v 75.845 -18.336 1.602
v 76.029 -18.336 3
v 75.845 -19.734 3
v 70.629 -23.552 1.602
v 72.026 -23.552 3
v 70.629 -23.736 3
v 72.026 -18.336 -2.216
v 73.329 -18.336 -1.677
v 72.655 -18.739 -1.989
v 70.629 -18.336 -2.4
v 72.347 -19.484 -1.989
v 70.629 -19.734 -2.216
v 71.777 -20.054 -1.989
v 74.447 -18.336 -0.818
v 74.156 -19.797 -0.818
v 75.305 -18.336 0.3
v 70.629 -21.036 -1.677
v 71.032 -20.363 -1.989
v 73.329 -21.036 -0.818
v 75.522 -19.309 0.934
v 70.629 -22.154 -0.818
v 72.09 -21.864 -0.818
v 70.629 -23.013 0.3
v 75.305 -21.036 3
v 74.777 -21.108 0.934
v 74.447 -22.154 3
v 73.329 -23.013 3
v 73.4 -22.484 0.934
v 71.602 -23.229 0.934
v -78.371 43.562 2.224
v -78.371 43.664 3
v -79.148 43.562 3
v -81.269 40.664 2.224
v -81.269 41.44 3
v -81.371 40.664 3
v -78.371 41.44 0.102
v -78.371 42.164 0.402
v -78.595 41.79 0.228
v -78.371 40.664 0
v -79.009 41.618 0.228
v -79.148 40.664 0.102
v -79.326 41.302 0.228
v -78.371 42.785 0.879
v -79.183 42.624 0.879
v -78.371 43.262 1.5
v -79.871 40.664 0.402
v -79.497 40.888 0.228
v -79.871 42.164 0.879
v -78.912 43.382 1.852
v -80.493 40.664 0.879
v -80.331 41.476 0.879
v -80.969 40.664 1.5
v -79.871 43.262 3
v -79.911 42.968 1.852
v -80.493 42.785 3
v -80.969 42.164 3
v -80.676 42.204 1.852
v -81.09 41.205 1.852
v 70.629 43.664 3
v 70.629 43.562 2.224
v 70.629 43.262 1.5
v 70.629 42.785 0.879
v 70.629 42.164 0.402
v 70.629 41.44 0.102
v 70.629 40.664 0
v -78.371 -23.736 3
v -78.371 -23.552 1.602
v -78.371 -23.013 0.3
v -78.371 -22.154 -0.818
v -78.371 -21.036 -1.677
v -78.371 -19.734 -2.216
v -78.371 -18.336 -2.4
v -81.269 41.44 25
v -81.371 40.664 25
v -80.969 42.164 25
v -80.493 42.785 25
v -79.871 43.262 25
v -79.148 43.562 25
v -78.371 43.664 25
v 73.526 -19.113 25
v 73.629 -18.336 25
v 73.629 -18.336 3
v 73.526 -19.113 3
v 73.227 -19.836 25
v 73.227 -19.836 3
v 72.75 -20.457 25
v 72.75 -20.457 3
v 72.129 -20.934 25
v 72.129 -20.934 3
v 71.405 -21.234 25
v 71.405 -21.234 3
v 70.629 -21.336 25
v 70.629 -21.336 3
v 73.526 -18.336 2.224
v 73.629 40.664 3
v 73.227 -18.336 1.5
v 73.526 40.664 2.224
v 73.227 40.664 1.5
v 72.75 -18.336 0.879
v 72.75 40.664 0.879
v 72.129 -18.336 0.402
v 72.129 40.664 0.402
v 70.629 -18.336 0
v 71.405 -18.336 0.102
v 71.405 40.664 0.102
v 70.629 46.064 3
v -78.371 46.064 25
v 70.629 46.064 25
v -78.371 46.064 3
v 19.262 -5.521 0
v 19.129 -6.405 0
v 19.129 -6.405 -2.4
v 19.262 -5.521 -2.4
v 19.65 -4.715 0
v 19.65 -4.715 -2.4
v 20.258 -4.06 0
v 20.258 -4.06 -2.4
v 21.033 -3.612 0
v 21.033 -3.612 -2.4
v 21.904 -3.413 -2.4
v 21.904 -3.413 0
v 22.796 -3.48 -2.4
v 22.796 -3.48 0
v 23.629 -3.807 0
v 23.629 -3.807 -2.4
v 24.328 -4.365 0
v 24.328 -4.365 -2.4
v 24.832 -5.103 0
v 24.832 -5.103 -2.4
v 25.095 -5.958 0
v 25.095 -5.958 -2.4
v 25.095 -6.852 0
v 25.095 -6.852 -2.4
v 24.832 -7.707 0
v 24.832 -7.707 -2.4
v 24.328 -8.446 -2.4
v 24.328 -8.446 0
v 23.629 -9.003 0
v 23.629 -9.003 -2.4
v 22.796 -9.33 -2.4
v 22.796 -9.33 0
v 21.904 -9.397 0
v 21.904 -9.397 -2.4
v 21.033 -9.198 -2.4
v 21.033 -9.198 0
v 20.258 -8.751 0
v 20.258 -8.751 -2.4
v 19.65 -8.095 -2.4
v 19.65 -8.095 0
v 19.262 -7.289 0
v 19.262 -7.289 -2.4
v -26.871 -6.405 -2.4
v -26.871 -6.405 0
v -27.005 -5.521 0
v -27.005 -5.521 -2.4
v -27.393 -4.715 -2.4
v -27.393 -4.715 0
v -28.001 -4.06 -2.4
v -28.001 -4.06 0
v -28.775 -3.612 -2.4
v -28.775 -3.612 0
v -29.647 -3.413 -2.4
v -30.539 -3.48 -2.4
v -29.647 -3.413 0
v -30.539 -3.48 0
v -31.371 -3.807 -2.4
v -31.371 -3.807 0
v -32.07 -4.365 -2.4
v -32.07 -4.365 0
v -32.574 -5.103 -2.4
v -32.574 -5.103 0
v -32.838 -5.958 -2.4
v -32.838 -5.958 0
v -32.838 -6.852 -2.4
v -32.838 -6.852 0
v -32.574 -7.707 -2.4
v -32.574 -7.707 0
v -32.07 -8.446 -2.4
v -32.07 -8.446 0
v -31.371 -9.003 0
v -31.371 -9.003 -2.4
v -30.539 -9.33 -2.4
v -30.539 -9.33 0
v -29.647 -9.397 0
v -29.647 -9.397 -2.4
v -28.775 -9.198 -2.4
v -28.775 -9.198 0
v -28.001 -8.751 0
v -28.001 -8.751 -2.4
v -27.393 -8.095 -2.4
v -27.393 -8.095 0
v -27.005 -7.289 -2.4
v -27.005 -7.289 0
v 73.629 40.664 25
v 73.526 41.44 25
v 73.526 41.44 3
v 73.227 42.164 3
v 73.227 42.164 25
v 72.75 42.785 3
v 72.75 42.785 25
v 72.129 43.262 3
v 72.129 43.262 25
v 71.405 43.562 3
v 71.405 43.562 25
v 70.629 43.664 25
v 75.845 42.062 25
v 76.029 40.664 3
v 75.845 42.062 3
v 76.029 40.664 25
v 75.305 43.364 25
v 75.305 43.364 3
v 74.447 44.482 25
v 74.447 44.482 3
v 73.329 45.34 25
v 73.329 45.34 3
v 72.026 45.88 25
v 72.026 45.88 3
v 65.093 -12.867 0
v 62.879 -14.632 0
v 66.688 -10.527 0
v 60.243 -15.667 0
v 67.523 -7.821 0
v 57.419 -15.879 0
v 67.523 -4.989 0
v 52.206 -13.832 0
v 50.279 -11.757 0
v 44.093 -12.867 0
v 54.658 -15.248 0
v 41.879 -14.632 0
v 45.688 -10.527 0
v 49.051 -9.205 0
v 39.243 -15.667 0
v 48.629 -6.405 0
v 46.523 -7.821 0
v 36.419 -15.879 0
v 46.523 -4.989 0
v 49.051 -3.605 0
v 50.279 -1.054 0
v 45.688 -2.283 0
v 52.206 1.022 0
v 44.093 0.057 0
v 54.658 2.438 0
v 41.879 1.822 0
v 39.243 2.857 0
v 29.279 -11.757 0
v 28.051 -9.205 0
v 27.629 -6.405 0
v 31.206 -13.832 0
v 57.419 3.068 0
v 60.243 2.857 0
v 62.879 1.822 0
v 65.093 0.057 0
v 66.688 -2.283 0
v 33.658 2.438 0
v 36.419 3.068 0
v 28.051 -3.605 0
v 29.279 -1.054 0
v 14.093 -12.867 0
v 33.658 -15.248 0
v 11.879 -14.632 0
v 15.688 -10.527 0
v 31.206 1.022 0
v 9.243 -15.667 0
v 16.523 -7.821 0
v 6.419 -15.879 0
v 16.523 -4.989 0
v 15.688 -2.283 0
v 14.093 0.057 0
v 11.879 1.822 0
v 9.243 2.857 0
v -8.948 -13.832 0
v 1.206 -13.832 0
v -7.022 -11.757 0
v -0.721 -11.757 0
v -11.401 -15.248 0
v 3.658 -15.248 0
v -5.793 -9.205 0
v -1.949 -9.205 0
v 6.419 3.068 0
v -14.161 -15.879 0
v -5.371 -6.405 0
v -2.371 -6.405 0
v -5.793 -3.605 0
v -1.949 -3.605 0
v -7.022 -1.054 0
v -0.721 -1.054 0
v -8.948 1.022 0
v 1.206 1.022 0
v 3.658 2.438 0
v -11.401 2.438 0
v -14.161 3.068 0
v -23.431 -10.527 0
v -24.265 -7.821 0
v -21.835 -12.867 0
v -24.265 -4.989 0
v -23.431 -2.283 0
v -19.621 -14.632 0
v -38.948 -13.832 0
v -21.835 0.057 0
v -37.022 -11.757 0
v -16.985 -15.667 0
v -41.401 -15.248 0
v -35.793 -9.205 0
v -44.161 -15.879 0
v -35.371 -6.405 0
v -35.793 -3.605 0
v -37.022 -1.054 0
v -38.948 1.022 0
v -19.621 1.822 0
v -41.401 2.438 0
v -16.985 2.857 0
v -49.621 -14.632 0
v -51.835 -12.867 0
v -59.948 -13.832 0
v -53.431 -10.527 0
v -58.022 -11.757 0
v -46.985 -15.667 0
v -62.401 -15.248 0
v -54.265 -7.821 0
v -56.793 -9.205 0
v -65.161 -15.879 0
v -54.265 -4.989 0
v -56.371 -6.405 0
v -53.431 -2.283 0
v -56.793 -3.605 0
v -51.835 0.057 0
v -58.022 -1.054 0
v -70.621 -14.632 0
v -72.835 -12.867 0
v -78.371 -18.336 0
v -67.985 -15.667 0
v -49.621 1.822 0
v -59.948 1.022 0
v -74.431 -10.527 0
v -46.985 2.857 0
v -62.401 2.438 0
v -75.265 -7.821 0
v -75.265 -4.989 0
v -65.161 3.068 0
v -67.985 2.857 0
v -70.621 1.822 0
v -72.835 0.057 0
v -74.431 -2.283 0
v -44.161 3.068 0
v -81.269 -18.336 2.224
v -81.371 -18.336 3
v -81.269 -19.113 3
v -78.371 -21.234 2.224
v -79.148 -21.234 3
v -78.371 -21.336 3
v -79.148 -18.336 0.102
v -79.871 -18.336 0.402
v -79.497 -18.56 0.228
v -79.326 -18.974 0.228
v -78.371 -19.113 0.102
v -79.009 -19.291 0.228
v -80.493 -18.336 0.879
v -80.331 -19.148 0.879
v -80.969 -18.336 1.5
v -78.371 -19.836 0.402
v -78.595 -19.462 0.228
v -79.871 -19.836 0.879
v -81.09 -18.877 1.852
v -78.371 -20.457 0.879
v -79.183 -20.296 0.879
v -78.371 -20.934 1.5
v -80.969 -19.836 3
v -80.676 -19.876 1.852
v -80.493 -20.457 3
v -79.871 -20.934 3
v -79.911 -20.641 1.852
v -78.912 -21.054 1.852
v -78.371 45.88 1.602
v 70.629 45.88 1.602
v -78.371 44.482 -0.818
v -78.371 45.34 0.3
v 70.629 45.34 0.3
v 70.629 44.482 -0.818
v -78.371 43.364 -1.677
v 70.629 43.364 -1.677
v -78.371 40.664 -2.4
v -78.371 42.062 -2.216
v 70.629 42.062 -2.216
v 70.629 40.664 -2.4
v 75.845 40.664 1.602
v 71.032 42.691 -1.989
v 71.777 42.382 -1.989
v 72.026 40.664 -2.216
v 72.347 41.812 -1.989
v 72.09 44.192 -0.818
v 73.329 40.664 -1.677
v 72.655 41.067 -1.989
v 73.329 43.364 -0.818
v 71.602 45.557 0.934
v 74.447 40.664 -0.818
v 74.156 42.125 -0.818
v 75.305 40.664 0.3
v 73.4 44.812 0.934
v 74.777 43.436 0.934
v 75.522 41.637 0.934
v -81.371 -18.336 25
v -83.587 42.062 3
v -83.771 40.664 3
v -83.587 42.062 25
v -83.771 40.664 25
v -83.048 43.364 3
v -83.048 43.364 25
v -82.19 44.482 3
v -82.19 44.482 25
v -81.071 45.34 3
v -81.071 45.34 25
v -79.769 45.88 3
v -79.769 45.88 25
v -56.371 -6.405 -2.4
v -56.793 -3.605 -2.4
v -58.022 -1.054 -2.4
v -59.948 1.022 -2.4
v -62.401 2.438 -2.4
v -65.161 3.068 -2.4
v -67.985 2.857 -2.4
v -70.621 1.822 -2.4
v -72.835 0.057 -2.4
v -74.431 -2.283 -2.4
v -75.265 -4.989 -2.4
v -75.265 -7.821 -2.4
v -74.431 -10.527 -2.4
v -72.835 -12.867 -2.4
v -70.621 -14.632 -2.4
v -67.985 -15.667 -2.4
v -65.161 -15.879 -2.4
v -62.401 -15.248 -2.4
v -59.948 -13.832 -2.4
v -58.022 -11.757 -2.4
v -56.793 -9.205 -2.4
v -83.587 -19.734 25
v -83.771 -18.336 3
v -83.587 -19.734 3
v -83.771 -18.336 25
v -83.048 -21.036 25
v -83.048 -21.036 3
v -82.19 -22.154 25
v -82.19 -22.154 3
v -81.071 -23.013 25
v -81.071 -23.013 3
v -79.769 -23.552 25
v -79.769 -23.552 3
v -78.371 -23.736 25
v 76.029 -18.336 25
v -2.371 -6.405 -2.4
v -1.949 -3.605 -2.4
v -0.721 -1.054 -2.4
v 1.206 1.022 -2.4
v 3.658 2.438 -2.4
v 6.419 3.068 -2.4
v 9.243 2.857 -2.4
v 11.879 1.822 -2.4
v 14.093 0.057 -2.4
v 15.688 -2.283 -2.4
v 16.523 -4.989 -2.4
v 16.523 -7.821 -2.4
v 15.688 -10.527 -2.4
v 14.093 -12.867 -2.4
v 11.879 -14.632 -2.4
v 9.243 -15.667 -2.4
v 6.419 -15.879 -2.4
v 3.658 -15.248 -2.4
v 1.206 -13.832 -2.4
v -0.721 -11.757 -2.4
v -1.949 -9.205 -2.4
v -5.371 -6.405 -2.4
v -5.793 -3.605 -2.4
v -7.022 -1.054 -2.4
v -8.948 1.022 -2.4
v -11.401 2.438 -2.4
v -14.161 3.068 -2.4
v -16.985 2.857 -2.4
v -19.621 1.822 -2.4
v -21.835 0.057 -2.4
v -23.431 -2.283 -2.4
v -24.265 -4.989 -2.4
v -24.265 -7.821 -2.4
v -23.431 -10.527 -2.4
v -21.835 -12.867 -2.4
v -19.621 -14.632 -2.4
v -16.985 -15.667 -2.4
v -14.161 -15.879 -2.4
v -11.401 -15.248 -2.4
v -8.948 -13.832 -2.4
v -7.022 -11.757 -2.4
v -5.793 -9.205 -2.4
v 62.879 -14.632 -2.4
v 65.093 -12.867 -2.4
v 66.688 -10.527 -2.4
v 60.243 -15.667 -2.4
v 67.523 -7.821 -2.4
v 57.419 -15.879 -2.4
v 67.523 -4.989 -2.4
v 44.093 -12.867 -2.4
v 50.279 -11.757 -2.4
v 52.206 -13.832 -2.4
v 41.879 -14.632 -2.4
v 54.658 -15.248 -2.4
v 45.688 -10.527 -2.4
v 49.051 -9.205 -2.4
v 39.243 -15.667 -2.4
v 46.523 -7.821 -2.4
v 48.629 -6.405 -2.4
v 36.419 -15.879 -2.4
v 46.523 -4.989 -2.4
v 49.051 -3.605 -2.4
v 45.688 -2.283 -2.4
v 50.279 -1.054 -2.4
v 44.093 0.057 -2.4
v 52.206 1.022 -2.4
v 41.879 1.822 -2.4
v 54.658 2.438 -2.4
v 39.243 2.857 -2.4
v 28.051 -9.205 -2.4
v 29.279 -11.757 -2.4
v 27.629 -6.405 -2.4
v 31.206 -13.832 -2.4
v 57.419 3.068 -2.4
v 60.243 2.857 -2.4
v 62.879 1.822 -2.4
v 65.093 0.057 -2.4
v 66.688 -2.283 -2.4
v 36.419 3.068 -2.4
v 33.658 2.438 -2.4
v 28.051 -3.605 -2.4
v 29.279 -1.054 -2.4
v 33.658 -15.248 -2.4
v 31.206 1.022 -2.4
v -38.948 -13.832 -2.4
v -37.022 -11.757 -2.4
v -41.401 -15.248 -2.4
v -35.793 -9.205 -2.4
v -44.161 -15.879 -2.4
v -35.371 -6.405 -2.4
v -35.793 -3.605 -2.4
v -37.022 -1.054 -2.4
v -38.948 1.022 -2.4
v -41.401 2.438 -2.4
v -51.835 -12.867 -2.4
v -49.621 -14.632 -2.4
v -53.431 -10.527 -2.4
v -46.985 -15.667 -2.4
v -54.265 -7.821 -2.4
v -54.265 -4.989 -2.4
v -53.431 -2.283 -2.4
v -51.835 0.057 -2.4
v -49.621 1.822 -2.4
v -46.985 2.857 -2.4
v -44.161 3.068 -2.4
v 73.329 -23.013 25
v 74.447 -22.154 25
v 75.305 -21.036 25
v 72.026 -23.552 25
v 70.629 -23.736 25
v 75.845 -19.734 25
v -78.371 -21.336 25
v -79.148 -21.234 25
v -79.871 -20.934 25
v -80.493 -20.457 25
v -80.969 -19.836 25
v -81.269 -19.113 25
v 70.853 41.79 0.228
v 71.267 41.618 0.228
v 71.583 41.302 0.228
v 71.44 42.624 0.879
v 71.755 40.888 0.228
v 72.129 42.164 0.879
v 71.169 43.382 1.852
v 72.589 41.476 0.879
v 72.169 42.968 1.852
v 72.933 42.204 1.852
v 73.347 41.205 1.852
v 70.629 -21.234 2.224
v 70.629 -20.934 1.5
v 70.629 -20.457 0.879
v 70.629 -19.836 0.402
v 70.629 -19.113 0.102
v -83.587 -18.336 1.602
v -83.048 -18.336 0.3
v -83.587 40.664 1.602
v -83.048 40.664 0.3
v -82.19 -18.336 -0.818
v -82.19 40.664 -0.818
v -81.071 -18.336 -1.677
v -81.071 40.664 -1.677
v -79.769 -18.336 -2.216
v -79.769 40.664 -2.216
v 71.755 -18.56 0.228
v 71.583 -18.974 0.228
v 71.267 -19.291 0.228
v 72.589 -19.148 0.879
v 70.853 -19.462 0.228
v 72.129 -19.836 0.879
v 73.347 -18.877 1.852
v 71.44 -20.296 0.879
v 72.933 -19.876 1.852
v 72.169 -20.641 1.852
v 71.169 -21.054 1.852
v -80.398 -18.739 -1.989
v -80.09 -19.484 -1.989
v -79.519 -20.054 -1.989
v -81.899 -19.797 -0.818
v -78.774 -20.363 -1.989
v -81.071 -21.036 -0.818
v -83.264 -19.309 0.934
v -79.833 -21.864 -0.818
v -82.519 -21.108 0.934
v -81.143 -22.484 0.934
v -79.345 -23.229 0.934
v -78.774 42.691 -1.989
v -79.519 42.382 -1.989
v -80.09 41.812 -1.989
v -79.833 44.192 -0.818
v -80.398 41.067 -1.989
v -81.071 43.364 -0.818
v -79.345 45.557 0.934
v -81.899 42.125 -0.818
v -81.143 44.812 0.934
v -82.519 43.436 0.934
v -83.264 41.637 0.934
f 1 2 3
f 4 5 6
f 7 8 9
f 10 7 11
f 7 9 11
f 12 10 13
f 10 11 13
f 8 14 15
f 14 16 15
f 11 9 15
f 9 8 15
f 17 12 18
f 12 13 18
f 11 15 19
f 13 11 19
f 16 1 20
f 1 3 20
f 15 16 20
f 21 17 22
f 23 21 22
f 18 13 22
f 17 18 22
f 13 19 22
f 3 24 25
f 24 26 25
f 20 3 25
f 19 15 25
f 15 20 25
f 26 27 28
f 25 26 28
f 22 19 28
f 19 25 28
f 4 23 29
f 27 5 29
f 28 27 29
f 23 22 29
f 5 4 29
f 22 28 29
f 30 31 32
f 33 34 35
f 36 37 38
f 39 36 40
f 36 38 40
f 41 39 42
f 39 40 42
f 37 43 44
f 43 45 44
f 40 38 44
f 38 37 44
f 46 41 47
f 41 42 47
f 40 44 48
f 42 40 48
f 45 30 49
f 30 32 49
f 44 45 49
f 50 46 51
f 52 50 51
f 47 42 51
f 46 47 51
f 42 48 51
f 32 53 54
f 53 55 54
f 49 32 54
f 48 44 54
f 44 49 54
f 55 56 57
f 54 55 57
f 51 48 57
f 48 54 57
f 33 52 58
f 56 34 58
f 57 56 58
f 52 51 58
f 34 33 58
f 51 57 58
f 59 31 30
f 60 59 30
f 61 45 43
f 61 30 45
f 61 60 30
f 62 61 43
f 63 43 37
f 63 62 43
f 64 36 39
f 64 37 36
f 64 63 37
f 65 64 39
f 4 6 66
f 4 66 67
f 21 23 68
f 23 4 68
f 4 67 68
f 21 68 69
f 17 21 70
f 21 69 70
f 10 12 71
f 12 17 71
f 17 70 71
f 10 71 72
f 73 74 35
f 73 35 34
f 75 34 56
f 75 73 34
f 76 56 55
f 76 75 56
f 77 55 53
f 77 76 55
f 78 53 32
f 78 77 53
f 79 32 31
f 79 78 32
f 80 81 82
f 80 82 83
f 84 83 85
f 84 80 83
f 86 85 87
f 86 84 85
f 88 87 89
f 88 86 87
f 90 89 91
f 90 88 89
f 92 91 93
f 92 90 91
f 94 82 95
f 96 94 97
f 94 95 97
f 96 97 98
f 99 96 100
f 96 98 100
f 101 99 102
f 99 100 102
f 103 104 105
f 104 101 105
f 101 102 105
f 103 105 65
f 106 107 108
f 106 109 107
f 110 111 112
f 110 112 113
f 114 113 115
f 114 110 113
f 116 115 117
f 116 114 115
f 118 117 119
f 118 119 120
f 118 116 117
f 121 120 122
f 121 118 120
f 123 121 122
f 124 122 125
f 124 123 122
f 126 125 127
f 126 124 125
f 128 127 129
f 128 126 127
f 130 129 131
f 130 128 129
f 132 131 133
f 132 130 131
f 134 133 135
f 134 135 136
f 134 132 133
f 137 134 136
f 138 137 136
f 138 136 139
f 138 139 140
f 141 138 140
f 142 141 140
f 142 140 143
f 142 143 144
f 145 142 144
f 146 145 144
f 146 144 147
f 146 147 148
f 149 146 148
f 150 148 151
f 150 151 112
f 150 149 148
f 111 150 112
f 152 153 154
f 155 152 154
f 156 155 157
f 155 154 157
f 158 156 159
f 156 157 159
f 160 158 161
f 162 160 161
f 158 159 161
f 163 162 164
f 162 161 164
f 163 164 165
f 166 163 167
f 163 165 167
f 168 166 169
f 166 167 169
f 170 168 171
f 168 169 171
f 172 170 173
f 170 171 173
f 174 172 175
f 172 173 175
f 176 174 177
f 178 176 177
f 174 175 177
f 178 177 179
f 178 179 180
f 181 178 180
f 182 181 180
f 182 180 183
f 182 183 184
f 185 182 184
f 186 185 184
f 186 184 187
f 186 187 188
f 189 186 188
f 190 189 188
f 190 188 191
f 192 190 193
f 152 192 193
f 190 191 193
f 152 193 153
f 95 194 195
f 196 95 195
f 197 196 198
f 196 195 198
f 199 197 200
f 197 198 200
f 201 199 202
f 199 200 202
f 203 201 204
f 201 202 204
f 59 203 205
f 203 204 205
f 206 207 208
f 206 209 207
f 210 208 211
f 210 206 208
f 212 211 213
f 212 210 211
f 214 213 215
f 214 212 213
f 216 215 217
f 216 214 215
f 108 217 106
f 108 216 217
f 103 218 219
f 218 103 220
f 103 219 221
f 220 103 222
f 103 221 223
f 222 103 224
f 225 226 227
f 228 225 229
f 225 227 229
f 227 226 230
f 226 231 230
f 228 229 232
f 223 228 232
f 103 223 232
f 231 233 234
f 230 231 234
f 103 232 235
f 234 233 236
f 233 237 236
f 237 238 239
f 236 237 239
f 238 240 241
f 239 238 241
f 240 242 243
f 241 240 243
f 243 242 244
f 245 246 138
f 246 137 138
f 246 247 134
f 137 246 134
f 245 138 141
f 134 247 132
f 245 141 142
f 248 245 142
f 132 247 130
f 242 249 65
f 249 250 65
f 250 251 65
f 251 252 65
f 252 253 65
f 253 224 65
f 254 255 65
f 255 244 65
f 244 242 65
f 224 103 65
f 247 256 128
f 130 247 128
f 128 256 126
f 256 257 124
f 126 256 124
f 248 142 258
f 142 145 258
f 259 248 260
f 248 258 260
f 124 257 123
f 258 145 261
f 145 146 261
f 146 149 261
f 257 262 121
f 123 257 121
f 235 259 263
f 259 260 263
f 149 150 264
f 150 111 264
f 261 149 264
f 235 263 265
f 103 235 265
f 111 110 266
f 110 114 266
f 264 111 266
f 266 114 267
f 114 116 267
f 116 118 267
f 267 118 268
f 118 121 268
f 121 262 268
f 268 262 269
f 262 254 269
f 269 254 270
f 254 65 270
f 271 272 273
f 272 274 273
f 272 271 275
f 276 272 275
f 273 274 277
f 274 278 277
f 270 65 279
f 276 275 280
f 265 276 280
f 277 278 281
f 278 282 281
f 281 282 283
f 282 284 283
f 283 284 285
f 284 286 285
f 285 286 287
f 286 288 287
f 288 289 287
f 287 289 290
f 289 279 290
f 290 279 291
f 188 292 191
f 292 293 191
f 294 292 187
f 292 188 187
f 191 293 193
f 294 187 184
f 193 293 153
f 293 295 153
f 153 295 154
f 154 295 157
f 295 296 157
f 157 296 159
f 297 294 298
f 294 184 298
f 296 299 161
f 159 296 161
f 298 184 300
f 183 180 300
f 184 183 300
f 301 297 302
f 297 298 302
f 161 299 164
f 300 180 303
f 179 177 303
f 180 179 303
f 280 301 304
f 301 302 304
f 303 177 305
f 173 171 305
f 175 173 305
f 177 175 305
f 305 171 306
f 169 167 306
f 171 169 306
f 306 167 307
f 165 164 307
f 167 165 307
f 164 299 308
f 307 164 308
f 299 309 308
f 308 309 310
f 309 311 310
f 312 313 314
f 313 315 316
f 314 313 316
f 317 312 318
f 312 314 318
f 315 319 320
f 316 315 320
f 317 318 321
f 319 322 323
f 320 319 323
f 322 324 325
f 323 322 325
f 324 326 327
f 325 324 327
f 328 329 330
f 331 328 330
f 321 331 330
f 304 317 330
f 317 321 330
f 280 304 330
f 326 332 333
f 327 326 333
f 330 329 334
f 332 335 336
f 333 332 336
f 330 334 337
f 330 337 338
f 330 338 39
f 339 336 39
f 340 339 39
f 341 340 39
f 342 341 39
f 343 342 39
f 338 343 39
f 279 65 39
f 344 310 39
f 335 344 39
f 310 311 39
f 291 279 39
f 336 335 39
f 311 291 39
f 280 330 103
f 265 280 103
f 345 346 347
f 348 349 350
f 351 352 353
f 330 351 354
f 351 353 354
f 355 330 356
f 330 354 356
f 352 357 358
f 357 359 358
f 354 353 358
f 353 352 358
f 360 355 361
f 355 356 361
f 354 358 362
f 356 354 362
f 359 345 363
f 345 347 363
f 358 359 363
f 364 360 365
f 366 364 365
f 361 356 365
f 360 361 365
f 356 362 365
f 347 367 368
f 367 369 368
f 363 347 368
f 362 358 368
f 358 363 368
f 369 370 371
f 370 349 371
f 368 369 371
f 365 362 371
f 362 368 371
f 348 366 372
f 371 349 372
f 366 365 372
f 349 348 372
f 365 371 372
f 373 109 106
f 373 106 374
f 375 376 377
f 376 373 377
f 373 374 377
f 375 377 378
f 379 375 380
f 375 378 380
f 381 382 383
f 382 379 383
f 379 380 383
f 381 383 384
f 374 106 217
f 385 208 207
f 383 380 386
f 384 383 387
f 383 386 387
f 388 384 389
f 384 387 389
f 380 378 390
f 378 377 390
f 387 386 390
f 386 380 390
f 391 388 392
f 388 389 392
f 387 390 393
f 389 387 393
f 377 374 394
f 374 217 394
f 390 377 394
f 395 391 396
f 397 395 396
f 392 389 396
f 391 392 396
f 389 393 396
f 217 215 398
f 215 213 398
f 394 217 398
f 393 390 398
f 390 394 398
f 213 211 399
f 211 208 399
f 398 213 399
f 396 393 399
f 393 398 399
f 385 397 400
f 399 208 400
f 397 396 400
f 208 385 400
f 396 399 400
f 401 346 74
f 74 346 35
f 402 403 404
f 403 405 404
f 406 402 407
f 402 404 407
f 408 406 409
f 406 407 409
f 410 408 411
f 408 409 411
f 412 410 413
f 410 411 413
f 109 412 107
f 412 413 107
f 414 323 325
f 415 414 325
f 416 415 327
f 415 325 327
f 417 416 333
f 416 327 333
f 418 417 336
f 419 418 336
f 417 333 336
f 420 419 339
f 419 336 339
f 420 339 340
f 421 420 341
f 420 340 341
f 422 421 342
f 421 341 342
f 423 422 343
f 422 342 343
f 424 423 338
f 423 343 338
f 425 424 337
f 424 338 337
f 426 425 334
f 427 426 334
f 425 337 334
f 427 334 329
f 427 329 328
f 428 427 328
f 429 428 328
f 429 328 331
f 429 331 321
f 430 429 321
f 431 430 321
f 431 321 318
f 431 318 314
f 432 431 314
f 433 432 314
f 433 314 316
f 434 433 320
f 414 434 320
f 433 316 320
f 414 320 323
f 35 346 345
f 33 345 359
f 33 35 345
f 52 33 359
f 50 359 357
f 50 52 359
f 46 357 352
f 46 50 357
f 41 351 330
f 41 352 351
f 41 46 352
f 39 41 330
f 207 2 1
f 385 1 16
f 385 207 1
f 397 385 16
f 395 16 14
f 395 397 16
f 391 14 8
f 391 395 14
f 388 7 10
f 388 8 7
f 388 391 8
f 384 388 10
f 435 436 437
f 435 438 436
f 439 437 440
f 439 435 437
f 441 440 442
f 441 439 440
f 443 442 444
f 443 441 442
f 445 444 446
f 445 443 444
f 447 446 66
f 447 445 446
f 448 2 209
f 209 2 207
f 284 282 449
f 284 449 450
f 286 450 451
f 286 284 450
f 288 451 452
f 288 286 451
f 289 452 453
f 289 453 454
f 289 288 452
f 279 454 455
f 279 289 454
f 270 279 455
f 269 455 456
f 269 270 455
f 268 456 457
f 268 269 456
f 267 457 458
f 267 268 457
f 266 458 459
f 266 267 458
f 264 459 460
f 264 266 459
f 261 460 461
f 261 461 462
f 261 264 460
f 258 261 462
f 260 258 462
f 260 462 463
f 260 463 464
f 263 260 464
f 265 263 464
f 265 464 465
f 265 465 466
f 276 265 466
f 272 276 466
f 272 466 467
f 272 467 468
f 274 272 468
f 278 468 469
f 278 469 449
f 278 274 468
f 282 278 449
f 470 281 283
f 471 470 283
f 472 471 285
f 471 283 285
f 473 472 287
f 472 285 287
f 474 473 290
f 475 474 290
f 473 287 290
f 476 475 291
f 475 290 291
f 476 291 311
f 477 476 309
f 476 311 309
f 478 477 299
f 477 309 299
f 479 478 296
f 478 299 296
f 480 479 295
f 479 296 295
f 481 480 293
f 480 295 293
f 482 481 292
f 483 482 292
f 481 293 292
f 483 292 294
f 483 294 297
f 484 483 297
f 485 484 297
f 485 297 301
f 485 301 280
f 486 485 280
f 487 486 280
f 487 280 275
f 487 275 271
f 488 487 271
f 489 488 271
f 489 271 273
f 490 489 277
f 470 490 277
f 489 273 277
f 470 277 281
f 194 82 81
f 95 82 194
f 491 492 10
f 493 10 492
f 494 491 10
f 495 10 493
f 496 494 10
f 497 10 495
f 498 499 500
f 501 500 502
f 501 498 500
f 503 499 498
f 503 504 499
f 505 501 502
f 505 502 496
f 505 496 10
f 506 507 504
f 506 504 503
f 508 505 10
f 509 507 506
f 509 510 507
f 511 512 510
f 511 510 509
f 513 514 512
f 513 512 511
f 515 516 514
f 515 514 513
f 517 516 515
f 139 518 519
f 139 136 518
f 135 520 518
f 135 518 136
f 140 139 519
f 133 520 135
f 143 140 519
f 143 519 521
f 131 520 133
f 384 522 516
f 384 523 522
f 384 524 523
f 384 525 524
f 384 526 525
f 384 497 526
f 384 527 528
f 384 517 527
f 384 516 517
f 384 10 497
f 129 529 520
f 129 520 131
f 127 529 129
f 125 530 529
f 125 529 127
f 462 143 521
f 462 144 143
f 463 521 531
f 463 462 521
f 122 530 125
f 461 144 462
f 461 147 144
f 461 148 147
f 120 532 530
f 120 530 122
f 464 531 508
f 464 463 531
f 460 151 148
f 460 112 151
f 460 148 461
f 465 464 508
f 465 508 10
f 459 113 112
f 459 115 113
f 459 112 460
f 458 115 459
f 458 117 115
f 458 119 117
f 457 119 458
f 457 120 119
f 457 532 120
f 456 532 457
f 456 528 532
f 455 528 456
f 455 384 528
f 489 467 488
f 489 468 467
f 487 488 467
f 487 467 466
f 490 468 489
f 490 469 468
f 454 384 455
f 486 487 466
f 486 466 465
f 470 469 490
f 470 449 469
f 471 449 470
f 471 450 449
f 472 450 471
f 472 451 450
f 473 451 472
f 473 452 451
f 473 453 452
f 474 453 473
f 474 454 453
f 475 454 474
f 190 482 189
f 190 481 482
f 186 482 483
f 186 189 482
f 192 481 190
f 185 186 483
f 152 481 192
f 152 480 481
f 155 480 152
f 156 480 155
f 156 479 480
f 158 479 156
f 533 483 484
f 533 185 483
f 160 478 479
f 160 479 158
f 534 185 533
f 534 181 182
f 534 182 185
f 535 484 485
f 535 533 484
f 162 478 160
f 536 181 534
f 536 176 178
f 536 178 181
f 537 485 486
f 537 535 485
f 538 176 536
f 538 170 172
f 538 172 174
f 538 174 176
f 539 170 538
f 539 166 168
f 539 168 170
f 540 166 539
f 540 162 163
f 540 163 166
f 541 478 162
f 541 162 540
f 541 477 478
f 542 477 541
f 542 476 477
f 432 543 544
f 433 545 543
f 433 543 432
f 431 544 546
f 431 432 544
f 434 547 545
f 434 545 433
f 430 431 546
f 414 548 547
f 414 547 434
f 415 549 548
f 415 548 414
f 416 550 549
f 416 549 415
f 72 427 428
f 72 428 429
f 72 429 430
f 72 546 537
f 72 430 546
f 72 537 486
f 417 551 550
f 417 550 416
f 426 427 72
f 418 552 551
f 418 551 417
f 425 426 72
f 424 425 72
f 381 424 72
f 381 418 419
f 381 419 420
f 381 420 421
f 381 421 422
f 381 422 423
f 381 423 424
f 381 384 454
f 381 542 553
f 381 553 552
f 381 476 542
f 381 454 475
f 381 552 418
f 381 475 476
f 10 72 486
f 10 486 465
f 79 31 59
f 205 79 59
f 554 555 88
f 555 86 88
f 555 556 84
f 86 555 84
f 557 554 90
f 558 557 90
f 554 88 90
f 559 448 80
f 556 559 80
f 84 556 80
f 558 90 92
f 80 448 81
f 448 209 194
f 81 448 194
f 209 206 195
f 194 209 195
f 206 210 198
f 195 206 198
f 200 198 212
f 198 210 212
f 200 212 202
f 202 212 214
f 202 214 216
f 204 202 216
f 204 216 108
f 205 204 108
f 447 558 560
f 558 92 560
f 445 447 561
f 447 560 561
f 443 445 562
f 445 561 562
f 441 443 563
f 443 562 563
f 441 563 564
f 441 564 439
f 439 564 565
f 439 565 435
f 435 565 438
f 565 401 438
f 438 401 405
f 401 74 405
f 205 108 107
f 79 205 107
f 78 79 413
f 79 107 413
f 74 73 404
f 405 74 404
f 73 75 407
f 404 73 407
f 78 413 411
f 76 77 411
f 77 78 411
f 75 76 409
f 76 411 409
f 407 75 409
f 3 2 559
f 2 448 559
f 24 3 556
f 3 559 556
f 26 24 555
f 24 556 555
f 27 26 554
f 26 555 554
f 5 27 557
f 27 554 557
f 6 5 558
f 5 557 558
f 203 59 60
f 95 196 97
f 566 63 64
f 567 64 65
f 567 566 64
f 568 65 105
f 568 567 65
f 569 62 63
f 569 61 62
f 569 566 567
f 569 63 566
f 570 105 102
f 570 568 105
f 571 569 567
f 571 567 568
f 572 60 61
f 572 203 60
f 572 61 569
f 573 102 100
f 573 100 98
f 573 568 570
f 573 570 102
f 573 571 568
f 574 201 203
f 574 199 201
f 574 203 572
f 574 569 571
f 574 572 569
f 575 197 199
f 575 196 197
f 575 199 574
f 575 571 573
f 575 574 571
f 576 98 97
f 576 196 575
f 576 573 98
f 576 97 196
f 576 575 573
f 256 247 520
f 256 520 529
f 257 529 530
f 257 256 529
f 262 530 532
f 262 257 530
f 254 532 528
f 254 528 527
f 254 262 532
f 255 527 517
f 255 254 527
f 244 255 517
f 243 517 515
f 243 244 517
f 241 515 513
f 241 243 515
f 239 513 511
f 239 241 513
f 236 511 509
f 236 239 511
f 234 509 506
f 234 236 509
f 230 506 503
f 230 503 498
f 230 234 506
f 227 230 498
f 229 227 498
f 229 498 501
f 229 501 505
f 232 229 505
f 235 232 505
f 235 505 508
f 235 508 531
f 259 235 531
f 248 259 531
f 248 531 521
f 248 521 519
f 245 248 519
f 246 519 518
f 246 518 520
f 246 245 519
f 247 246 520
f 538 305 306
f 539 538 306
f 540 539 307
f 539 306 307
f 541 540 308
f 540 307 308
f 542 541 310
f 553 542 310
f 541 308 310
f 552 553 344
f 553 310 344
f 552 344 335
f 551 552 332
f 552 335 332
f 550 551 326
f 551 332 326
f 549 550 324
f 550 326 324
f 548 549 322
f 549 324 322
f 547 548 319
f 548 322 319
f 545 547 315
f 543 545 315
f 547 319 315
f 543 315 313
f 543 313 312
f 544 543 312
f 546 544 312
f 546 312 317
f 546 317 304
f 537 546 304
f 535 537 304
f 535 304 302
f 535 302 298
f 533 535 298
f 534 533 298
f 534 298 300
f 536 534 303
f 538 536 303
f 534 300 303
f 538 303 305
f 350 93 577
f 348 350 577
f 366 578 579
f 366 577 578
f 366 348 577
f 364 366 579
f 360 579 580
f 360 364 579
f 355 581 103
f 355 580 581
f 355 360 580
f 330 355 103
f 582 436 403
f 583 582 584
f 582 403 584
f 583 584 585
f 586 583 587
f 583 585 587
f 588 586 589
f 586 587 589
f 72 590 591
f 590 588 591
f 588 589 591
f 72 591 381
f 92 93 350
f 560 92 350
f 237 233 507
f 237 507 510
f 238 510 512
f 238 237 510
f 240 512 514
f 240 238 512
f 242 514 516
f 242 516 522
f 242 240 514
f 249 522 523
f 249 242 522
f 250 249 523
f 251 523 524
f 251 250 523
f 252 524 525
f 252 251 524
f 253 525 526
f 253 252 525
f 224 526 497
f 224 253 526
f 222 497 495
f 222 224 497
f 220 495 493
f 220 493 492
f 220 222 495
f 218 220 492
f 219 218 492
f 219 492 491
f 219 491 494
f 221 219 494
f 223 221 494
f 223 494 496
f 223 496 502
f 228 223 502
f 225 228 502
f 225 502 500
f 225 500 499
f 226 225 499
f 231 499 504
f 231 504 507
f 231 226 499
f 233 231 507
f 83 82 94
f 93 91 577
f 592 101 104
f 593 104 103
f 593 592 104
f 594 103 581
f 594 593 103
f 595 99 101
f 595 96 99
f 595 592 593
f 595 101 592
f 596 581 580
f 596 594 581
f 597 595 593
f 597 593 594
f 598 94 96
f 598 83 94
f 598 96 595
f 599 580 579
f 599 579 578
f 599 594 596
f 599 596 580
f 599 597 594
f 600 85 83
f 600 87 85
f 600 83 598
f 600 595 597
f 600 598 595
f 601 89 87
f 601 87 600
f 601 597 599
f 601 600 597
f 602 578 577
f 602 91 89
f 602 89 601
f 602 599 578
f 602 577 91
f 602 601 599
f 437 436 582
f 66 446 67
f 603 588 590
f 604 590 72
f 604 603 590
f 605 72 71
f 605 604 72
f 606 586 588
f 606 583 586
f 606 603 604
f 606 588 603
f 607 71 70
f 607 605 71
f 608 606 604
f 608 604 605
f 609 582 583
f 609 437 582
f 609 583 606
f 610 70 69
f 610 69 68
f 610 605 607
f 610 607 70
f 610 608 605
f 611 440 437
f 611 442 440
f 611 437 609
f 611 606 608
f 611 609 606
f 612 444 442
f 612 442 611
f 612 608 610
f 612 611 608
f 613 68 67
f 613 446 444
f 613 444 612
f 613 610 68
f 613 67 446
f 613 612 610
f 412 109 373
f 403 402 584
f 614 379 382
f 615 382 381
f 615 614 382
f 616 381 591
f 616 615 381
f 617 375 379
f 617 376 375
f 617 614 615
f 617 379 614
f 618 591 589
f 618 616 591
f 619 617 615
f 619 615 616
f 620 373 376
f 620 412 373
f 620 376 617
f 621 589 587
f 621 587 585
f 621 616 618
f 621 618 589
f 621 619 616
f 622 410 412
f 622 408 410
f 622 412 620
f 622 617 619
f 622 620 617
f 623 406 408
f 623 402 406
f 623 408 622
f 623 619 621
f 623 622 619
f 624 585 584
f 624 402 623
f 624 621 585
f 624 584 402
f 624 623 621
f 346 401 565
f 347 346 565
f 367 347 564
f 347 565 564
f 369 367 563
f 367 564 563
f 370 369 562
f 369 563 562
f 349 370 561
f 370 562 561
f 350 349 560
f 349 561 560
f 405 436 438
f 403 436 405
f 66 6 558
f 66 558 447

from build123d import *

# Parameters (mm, degrees)
F0_W     = 77
F0_H     = 65
F0_R     = 9.5
F0_R_2   = 3
F0_W_2   = 0.5
F1_DEPTH = 25
F2_R     = 3
F3_T     = 2.4
F4_DEPTH = 2.4
F5_W     = 2.4
F5_H     = 69.8
F6_DEPTH = 27.078461


with BuildPart() as f1:
    # F0 (on Top) → F1 (new body)
    with BuildSketch(Plane.XY):
        with Locations((-42.871317, 11.163915)):
            Rectangle(F0_W, F0_H)
        with Locations((-65.871317, -6.405085)):
            Circle(F0_R, mode=Mode.SUBTRACT)
        with Locations((-44.871317, -6.405085)):
            Circle(F0_R, mode=Mode.SUBTRACT)
        with Locations((-29.871317, -6.405085)):
            Circle(F0_R_2, mode=Mode.SUBTRACT)
        with Locations((-14.871317, -6.405085)):
            Circle(F0_R, mode=Mode.SUBTRACT)
        with Locations((-65.871317, -6.405085)):
            Circle(F0_R)
        with Locations((-44.871317, -6.405085)):
            Circle(F0_R)
        with Locations((-29.871317, -6.405085)):
            Circle(F0_R_2)
        with Locations((-14.871317, -6.405085)):
            Circle(F0_R)
        with Locations((-4.121317, 11.163915)):
            Rectangle(F0_W_2, F0_H)
    extrude(amount=F1_DEPTH)

    # F2
    f2_edges = [f1.edges().sort_by_distance(p)[0] for p in [
        (-81.371317, -21.336085, 12.5),
        (-81.371317, 43.663915, 12.5),
        (-42.621317, 43.663915, 0),
        (-81.371317, 11.163915, 0),
        (-42.621317, -21.336085, 0),
    ]]
    fillet(f2_edges, radius=F2_R)

    # F3
    f3_openings = [f1.faces().sort_by_distance(p)[0] for p in [
        (-42.592095, 11.163915, 25),
    ]]
    offset(amount=F3_T, openings=f3_openings)

    # F0 (on Top) → F4 (cut, through all)
    with BuildSketch(Plane.XY):
        with Locations((-14.871317, -6.405085)):
            Circle(F0_R)
        with Locations((-29.871317, -6.405085)):
            Circle(F0_R_2)
        with Locations((-44.871317, -6.405085)):
            Circle(F0_R)
        with Locations((-65.871317, -6.405085)):
            Circle(F0_R)
    extrude(amount=-F4_DEPTH, mode=Mode.SUBTRACT)

    # F5 (on face) → F6 (cut, through all)
    with BuildSketch(Plane.XY.offset(25)):
        with Locations((-2.671317, 11.163915)):
            Rectangle(F5_W, F5_H)
    extrude(amount=-F6_DEPTH, mode=Mode.SUBTRACT)

    # F7: F1 across face


with BuildPart() as f1_1:
    add(f1.part)
    add(f1.part.mirror(Plane(origin=(-3.871317, 11.163915, 5.251674), x_dir=(0, 1, 0), z_dir=(1, 0, 0))))


solid = f1_1.part
